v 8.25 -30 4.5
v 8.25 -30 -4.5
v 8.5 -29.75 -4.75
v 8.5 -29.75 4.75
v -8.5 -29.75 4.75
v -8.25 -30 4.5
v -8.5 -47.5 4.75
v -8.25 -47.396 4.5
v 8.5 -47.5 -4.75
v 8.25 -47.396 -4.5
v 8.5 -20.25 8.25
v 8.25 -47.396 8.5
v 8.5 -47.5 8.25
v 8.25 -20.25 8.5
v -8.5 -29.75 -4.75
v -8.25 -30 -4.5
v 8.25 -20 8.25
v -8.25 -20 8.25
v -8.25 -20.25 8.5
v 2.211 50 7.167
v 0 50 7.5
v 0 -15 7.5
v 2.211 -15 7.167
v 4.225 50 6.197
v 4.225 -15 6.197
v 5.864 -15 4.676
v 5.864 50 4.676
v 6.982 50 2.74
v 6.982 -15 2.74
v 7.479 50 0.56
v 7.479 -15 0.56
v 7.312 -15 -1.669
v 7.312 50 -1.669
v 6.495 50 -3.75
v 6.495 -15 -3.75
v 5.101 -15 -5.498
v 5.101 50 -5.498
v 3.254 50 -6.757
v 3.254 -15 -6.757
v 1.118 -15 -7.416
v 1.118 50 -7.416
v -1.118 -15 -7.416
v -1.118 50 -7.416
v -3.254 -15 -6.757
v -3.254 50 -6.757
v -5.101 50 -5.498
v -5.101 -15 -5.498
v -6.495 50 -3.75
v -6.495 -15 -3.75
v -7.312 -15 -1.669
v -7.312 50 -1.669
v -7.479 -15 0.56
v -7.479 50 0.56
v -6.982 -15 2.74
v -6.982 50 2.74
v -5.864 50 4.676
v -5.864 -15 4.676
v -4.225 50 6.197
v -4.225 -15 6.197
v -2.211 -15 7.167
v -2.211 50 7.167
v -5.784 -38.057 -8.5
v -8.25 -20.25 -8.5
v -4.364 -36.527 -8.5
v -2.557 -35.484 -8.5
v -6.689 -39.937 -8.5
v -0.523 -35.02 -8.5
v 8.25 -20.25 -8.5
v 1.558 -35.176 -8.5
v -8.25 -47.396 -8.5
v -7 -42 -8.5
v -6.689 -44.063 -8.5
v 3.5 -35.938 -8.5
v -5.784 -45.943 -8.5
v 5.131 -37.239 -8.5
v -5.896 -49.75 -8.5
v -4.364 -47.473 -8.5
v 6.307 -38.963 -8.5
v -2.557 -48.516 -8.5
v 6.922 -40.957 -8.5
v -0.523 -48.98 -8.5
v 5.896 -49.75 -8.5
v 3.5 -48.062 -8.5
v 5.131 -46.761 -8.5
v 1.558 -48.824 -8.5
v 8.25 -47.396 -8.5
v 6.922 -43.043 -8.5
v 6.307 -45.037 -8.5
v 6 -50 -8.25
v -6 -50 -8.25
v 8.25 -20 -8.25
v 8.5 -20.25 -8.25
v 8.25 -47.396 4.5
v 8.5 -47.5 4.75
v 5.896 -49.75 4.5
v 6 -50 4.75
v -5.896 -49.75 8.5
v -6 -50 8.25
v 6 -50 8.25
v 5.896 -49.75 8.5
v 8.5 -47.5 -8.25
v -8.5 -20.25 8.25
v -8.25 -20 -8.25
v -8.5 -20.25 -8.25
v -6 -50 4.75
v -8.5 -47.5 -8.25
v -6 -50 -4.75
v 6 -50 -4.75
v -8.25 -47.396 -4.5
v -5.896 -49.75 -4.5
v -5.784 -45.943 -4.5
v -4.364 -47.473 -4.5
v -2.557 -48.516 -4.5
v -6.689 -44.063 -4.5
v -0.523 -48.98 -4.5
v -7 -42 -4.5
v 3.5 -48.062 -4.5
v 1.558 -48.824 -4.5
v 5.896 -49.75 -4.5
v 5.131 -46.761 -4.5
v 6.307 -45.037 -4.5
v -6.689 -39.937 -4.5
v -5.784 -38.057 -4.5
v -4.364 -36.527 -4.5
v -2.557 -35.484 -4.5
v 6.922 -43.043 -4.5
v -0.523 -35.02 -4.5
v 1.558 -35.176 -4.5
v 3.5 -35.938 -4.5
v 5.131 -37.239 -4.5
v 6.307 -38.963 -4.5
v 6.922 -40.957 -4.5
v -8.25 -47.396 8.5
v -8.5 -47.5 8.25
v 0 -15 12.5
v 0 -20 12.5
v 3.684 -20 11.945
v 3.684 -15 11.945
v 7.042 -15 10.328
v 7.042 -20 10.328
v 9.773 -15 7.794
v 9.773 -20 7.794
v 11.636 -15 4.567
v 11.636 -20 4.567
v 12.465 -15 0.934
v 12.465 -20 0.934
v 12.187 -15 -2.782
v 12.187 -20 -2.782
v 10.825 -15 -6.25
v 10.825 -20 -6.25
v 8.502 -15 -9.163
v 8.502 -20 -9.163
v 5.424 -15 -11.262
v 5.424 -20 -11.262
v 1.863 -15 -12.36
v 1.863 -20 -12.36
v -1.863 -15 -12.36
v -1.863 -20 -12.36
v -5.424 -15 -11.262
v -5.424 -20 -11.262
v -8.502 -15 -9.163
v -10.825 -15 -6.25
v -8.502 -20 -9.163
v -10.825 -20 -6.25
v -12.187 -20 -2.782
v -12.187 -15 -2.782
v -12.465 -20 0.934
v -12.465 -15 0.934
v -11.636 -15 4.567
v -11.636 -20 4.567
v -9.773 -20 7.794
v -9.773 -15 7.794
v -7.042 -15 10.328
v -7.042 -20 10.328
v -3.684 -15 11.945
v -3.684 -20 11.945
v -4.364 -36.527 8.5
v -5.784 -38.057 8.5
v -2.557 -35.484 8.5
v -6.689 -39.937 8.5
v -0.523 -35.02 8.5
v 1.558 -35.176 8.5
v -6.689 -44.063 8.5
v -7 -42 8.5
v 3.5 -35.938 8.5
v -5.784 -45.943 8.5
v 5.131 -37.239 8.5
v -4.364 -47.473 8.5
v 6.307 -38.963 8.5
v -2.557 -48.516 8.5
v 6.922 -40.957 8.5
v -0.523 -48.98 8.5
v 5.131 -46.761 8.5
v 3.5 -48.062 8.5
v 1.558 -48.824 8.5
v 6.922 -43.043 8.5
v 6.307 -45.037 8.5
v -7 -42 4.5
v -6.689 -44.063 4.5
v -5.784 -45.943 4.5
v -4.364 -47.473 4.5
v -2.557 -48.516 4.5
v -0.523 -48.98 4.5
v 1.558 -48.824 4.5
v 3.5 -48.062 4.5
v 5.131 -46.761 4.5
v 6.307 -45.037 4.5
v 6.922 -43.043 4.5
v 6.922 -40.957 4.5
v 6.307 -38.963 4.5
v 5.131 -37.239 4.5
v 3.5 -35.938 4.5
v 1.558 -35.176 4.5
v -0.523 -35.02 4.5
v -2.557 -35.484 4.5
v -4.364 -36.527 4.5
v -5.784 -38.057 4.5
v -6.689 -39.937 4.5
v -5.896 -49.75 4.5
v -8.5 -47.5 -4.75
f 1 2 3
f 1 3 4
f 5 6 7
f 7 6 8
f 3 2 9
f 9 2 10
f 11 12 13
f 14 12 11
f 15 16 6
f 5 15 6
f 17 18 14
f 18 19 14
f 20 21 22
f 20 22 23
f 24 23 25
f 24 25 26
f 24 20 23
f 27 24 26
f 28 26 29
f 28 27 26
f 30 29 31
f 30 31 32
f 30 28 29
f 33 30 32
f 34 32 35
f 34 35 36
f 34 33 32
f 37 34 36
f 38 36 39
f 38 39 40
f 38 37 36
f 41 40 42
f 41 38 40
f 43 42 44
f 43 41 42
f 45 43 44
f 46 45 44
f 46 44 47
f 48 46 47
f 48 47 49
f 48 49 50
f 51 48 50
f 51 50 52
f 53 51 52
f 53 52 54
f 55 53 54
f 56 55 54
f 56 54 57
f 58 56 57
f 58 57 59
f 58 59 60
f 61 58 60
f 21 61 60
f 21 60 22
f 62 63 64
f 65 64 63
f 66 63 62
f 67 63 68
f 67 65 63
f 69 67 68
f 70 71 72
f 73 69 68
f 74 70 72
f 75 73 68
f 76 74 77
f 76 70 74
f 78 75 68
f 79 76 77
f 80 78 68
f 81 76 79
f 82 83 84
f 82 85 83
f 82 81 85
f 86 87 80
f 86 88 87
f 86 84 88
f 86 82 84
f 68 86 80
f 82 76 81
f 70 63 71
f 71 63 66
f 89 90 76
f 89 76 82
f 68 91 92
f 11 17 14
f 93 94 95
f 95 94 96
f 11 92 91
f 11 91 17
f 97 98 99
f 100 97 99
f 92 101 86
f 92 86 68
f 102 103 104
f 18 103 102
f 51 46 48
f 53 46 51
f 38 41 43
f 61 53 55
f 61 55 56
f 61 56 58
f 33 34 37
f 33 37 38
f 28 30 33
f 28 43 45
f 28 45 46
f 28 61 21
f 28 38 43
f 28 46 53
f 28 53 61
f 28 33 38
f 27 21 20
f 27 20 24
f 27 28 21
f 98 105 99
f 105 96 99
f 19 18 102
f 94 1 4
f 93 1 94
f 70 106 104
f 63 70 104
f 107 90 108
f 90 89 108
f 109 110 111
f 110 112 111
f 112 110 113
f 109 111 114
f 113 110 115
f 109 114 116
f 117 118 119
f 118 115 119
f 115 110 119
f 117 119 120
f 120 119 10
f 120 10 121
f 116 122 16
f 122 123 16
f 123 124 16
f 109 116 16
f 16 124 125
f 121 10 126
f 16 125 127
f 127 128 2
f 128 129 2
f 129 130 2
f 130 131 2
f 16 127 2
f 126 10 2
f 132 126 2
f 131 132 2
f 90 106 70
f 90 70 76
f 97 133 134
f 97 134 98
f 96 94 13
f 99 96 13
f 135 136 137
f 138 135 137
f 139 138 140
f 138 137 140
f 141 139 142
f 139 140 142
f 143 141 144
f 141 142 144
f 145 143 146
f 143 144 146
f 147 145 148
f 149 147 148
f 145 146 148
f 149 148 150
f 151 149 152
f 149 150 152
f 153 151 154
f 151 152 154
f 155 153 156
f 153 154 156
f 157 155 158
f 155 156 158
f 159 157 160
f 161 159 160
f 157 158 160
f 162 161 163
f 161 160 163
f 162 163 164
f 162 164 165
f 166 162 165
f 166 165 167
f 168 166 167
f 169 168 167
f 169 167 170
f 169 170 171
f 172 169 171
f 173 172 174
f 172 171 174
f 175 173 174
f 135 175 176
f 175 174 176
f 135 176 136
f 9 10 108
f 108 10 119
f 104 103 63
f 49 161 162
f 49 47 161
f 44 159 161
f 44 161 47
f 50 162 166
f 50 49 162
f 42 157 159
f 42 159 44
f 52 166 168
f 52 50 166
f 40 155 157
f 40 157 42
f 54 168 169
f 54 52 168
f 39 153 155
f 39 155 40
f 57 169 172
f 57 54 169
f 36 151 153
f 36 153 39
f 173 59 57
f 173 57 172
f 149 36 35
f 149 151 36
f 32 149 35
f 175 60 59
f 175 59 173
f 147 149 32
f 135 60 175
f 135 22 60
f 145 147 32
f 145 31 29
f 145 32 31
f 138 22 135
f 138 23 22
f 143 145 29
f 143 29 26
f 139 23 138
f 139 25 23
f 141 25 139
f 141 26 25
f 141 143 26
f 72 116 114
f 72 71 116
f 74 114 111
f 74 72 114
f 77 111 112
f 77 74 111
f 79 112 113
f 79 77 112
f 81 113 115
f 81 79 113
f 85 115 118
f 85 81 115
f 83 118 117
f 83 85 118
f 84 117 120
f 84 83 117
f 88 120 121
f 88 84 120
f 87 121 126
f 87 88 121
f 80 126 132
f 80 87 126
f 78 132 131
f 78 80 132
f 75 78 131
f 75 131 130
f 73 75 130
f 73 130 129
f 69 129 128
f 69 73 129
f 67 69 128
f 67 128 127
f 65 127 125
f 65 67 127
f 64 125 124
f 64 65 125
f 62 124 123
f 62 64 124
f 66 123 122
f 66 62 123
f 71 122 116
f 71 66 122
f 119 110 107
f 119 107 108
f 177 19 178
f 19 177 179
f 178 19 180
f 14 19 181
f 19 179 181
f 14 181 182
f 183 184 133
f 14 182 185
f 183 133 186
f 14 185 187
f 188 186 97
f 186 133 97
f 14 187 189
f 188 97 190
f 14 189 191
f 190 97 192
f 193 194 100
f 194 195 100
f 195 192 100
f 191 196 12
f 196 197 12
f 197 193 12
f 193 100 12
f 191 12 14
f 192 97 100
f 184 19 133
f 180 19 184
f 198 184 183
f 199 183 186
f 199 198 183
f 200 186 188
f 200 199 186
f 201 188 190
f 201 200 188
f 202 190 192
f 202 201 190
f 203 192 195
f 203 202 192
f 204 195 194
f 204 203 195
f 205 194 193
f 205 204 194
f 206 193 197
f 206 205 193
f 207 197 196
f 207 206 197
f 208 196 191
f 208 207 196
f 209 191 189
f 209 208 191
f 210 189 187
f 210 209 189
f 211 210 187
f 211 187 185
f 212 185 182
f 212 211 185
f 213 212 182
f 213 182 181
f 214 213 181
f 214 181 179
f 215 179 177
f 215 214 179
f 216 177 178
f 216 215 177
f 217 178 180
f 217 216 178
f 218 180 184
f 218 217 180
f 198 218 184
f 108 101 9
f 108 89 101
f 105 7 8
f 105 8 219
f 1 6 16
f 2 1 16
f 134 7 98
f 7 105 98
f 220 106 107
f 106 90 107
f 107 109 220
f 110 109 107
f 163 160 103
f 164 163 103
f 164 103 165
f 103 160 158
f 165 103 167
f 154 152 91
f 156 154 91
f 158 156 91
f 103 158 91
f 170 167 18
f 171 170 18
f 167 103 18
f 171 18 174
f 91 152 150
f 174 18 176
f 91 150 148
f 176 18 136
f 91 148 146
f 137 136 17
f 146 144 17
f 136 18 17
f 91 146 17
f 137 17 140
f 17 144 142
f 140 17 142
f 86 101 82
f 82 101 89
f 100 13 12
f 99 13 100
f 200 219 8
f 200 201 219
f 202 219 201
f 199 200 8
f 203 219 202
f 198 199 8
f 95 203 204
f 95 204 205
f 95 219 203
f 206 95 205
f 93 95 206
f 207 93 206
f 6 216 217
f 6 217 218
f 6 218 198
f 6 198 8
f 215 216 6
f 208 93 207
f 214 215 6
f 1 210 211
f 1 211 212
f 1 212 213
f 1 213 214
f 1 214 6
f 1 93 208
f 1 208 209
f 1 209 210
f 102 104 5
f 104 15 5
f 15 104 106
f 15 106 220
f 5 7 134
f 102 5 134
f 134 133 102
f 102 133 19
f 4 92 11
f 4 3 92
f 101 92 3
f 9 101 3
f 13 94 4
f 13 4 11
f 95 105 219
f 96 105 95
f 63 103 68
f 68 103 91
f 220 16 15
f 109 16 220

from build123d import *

# Parameters (mm, degrees)
SKETCH1_R                           = 12.5
BOSS_EXTRUDE1_DEPTH                 = 50
CUT_EXTRUDE1_REACH                  = 55.033
CUT_EXTRUDE1_END_RADIUS             = 12.5
SKETCH2_R                           = 7
CUT_EXTRUDE1_DIRECTION_2_REACH      = 55.033
CUT_EXTRUDE1_DIRECTION_2_END_RADIUS = 12.5
CUT_EXTRUDE2_REACH                  = 55.033
SKETCH3_W                           = 9
SKETCH3_H                           = 20
CUT_EXTRUDE2_DIRECTION_2_REACH      = 55.033
SKETCH4_OUTSIDE_W                   = 48.214
SKETCH4_OUTSIDE_H                   = 48.214
SKETCH4_OUTSIDE_W_2                 = 17
SKETCH4_OUTSIDE_H_2                 = 17
CUT_EXTRUDE4_DEPTH                  = 30
SKETCH5_R                           = 12.5
SKETCH5_R_2                         = 7.5
CUT_EXTRUDE5_DEPTH                  = 70
CHAMFER2_SIZE                       = 2.5
CHAMFER1_SIZE                       = 0.25
SKETCH7_R                           = 12.5
BOSS_EXTRUDE2_DEPTH                 = 5


with BuildPart() as part:
    # Sketch1 → Boss-Extrude1 (new, symmetric)
    with BuildSketch(Plane(origin=(0, 0, 0), x_dir=(1, 0, 0), z_dir=(0, 1, 0))):
        with Locations(Location((0, 0, 0), (0, 0, 270))):
            Circle(SKETCH1_R)
    extrude(amount=BOSS_EXTRUDE1_DEPTH, both=True)

    # Cut-Extrude1: up to this cylinder (the profile starts inside it)
    cut_extrude1_end = Plane(origin=(0, -42, 0), z_dir=(0, -1, 0)) * Cylinder(CUT_EXTRUDE1_END_RADIUS, 136.066, mode=Mode.PRIVATE)
    # Sketch2 → Cut-Extrude1 (cut, up to the surface)
    with BuildSketch(Plane.XY, mode=Mode.PRIVATE) as cut_extrude1_sk1:
        with Locations(Location((0, -42, 0), (0, 0, 180))):
            Circle(SKETCH2_R)
    cut_extrude1_tool1 = extrude(cut_extrude1_sk1.sketch, amount=-CUT_EXTRUDE1_REACH, mode=Mode.PRIVATE) & cut_extrude1_end
    add(cut_extrude1_tool1.solids().sort_by_distance((0, -42, 0))[0], mode=Mode.SUBTRACT)

    # Cut-Extrude1 direction 2: up to this cylinder (the profile starts inside it)
    cut_extrude1_direction_2_end = Plane(origin=(0, -42, 0), z_dir=(0, -1, 0)) * Cylinder(CUT_EXTRUDE1_DIRECTION_2_END_RADIUS, 136.066, mode=Mode.PRIVATE)
    # Sketch2 → Cut-Extrude1 direction 2 (cut, up to the surface)
    with BuildSketch(Plane.XY, mode=Mode.PRIVATE) as cut_extrude1_direction_2_sk1:
        with Locations(Location((0, -42, 0), (0, 0, 180))):
            Circle(SKETCH2_R)
    cut_extrude1_direction_2_tool1 = extrude(cut_extrude1_direction_2_sk1.sketch, amount=CUT_EXTRUDE1_DIRECTION_2_REACH, mode=Mode.PRIVATE) & cut_extrude1_direction_2_end
    add(cut_extrude1_direction_2_tool1.solids().sort_by_distance((0, -42, 0))[0], mode=Mode.SUBTRACT)

    # Sketch3 → Cut-Extrude2 (cut, up to next)
    with BuildSketch(Plane(origin=(0, 0, 0), x_dir=(0, 0, -1), z_dir=(1, 0, 0)), mode=Mode.PRIVATE) as cut_extrude2_sk1:
        with Locations((0, -40)):
            Rectangle(SKETCH3_W, SKETCH3_H)
    cut_extrude2_tool1 = extrude(cut_extrude2_sk1.sketch, amount=-CUT_EXTRUDE2_REACH, mode=Mode.PRIVATE) & part.part
    add(cut_extrude2_tool1.solids().sort_by_distance((0, -40, 0))[0], mode=Mode.SUBTRACT)

    # Sketch3 → Cut-Extrude2 direction 2 (cut, up to next)
    with BuildSketch(Plane(origin=(0, 0, 0), x_dir=(0, 0, -1), z_dir=(1, 0, 0)), mode=Mode.PRIVATE) as cut_extrude2_direction_2_sk1:
        with Locations((0, -40)):
            Rectangle(SKETCH3_W, SKETCH3_H)
    cut_extrude2_direction_2_tool1 = extrude(cut_extrude2_direction_2_sk1.sketch, amount=CUT_EXTRUDE2_DIRECTION_2_REACH, mode=Mode.PRIVATE) & part.part
    add(cut_extrude2_direction_2_tool1.solids().sort_by_distance((0, -40, 0))[0], mode=Mode.SUBTRACT)

    # Sketch4 outside → Cut-Extrude4 (cut)
    with BuildSketch(Plane.XZ.offset(50)):
        Rectangle(SKETCH4_OUTSIDE_W, SKETCH4_OUTSIDE_H)
        Rectangle(SKETCH4_OUTSIDE_W_2, SKETCH4_OUTSIDE_H_2, mode=Mode.SUBTRACT)
    extrude(amount=-CUT_EXTRUDE4_DEPTH, mode=Mode.SUBTRACT)

    # Sketch5 → Cut-Extrude5 (cut)
    with BuildSketch(Plane(origin=(0, 50, 0), x_dir=(1, 0, 0), z_dir=(0, 1, 0))):
        Circle(SKETCH5_R)
        with Locations(Location((0, 0, 0), (0, 0, 270))):
            Circle(SKETCH5_R_2, mode=Mode.SUBTRACT)
    extrude(amount=-CUT_EXTRUDE5_DEPTH, mode=Mode.SUBTRACT)

    # Chamfer2
    chamfer2_edges = [part.edges().sort_by_distance(p)[0] for p in [
        (8.5, -50, 6.5),
        (8.5, -50, -6.5),
        (-8.5, -50, 6.5),
        (-8.5, -50, -6.5),
    ]]
    chamfer(chamfer2_edges, length=CHAMFER2_SIZE)

    # Chamfer1
    chamfer1_edges = [part.edges().sort_by_distance(p)[0] for p in [
        (-8.5, -30, 0),
        (8.5, -30, 0),
        (0, -20, -8.5),
        (8.5, -20, 0),
        (0, -20, 8.5),
        (-8.5, -20, 0),
        (8.5, -38.75, 4.5),
        (8.5, -33.75, -8.5),
        (-8.5, -33.75, -8.5),
        (-8.5, -38.75, -4.5),
        (-8.5, -33.75, 8.5),
        (8.5, -33.75, 8.5),
        (0, -50, -4.5),
        (0, -50, -8.5),
        (8.5, -38.75, -4.5),
        (-7.25, -48.75, -4.5),
        (7.25, -48.75, -4.5),
        (-7.25, -48.75, -8.5),
        (7.25, -48.75, -8.5),
        (0, -50, 8.5),
        (0, -50, 4.5),
        (-7.25, -48.75, 8.5),
        (7.25, -48.75, 8.5),
        (-8.5, -38.75, 4.5),
        (-7.25, -48.75, 4.5),
        (7.25, -48.75, 4.5),
    ]]
    chamfer(chamfer1_edges, length=CHAMFER1_SIZE)

    # Sketch7 → Boss-Extrude2 (add)
    with BuildSketch(Plane(origin=(0, -20, 0), x_dir=(1, 0, 0), z_dir=(0, 1, 0))):
        with Locations(Location((0, 0, 0), (0, 0, 270))):
            Circle(SKETCH7_R)
    extrude(amount=BOSS_EXTRUDE2_DEPTH)


solid = part.part
